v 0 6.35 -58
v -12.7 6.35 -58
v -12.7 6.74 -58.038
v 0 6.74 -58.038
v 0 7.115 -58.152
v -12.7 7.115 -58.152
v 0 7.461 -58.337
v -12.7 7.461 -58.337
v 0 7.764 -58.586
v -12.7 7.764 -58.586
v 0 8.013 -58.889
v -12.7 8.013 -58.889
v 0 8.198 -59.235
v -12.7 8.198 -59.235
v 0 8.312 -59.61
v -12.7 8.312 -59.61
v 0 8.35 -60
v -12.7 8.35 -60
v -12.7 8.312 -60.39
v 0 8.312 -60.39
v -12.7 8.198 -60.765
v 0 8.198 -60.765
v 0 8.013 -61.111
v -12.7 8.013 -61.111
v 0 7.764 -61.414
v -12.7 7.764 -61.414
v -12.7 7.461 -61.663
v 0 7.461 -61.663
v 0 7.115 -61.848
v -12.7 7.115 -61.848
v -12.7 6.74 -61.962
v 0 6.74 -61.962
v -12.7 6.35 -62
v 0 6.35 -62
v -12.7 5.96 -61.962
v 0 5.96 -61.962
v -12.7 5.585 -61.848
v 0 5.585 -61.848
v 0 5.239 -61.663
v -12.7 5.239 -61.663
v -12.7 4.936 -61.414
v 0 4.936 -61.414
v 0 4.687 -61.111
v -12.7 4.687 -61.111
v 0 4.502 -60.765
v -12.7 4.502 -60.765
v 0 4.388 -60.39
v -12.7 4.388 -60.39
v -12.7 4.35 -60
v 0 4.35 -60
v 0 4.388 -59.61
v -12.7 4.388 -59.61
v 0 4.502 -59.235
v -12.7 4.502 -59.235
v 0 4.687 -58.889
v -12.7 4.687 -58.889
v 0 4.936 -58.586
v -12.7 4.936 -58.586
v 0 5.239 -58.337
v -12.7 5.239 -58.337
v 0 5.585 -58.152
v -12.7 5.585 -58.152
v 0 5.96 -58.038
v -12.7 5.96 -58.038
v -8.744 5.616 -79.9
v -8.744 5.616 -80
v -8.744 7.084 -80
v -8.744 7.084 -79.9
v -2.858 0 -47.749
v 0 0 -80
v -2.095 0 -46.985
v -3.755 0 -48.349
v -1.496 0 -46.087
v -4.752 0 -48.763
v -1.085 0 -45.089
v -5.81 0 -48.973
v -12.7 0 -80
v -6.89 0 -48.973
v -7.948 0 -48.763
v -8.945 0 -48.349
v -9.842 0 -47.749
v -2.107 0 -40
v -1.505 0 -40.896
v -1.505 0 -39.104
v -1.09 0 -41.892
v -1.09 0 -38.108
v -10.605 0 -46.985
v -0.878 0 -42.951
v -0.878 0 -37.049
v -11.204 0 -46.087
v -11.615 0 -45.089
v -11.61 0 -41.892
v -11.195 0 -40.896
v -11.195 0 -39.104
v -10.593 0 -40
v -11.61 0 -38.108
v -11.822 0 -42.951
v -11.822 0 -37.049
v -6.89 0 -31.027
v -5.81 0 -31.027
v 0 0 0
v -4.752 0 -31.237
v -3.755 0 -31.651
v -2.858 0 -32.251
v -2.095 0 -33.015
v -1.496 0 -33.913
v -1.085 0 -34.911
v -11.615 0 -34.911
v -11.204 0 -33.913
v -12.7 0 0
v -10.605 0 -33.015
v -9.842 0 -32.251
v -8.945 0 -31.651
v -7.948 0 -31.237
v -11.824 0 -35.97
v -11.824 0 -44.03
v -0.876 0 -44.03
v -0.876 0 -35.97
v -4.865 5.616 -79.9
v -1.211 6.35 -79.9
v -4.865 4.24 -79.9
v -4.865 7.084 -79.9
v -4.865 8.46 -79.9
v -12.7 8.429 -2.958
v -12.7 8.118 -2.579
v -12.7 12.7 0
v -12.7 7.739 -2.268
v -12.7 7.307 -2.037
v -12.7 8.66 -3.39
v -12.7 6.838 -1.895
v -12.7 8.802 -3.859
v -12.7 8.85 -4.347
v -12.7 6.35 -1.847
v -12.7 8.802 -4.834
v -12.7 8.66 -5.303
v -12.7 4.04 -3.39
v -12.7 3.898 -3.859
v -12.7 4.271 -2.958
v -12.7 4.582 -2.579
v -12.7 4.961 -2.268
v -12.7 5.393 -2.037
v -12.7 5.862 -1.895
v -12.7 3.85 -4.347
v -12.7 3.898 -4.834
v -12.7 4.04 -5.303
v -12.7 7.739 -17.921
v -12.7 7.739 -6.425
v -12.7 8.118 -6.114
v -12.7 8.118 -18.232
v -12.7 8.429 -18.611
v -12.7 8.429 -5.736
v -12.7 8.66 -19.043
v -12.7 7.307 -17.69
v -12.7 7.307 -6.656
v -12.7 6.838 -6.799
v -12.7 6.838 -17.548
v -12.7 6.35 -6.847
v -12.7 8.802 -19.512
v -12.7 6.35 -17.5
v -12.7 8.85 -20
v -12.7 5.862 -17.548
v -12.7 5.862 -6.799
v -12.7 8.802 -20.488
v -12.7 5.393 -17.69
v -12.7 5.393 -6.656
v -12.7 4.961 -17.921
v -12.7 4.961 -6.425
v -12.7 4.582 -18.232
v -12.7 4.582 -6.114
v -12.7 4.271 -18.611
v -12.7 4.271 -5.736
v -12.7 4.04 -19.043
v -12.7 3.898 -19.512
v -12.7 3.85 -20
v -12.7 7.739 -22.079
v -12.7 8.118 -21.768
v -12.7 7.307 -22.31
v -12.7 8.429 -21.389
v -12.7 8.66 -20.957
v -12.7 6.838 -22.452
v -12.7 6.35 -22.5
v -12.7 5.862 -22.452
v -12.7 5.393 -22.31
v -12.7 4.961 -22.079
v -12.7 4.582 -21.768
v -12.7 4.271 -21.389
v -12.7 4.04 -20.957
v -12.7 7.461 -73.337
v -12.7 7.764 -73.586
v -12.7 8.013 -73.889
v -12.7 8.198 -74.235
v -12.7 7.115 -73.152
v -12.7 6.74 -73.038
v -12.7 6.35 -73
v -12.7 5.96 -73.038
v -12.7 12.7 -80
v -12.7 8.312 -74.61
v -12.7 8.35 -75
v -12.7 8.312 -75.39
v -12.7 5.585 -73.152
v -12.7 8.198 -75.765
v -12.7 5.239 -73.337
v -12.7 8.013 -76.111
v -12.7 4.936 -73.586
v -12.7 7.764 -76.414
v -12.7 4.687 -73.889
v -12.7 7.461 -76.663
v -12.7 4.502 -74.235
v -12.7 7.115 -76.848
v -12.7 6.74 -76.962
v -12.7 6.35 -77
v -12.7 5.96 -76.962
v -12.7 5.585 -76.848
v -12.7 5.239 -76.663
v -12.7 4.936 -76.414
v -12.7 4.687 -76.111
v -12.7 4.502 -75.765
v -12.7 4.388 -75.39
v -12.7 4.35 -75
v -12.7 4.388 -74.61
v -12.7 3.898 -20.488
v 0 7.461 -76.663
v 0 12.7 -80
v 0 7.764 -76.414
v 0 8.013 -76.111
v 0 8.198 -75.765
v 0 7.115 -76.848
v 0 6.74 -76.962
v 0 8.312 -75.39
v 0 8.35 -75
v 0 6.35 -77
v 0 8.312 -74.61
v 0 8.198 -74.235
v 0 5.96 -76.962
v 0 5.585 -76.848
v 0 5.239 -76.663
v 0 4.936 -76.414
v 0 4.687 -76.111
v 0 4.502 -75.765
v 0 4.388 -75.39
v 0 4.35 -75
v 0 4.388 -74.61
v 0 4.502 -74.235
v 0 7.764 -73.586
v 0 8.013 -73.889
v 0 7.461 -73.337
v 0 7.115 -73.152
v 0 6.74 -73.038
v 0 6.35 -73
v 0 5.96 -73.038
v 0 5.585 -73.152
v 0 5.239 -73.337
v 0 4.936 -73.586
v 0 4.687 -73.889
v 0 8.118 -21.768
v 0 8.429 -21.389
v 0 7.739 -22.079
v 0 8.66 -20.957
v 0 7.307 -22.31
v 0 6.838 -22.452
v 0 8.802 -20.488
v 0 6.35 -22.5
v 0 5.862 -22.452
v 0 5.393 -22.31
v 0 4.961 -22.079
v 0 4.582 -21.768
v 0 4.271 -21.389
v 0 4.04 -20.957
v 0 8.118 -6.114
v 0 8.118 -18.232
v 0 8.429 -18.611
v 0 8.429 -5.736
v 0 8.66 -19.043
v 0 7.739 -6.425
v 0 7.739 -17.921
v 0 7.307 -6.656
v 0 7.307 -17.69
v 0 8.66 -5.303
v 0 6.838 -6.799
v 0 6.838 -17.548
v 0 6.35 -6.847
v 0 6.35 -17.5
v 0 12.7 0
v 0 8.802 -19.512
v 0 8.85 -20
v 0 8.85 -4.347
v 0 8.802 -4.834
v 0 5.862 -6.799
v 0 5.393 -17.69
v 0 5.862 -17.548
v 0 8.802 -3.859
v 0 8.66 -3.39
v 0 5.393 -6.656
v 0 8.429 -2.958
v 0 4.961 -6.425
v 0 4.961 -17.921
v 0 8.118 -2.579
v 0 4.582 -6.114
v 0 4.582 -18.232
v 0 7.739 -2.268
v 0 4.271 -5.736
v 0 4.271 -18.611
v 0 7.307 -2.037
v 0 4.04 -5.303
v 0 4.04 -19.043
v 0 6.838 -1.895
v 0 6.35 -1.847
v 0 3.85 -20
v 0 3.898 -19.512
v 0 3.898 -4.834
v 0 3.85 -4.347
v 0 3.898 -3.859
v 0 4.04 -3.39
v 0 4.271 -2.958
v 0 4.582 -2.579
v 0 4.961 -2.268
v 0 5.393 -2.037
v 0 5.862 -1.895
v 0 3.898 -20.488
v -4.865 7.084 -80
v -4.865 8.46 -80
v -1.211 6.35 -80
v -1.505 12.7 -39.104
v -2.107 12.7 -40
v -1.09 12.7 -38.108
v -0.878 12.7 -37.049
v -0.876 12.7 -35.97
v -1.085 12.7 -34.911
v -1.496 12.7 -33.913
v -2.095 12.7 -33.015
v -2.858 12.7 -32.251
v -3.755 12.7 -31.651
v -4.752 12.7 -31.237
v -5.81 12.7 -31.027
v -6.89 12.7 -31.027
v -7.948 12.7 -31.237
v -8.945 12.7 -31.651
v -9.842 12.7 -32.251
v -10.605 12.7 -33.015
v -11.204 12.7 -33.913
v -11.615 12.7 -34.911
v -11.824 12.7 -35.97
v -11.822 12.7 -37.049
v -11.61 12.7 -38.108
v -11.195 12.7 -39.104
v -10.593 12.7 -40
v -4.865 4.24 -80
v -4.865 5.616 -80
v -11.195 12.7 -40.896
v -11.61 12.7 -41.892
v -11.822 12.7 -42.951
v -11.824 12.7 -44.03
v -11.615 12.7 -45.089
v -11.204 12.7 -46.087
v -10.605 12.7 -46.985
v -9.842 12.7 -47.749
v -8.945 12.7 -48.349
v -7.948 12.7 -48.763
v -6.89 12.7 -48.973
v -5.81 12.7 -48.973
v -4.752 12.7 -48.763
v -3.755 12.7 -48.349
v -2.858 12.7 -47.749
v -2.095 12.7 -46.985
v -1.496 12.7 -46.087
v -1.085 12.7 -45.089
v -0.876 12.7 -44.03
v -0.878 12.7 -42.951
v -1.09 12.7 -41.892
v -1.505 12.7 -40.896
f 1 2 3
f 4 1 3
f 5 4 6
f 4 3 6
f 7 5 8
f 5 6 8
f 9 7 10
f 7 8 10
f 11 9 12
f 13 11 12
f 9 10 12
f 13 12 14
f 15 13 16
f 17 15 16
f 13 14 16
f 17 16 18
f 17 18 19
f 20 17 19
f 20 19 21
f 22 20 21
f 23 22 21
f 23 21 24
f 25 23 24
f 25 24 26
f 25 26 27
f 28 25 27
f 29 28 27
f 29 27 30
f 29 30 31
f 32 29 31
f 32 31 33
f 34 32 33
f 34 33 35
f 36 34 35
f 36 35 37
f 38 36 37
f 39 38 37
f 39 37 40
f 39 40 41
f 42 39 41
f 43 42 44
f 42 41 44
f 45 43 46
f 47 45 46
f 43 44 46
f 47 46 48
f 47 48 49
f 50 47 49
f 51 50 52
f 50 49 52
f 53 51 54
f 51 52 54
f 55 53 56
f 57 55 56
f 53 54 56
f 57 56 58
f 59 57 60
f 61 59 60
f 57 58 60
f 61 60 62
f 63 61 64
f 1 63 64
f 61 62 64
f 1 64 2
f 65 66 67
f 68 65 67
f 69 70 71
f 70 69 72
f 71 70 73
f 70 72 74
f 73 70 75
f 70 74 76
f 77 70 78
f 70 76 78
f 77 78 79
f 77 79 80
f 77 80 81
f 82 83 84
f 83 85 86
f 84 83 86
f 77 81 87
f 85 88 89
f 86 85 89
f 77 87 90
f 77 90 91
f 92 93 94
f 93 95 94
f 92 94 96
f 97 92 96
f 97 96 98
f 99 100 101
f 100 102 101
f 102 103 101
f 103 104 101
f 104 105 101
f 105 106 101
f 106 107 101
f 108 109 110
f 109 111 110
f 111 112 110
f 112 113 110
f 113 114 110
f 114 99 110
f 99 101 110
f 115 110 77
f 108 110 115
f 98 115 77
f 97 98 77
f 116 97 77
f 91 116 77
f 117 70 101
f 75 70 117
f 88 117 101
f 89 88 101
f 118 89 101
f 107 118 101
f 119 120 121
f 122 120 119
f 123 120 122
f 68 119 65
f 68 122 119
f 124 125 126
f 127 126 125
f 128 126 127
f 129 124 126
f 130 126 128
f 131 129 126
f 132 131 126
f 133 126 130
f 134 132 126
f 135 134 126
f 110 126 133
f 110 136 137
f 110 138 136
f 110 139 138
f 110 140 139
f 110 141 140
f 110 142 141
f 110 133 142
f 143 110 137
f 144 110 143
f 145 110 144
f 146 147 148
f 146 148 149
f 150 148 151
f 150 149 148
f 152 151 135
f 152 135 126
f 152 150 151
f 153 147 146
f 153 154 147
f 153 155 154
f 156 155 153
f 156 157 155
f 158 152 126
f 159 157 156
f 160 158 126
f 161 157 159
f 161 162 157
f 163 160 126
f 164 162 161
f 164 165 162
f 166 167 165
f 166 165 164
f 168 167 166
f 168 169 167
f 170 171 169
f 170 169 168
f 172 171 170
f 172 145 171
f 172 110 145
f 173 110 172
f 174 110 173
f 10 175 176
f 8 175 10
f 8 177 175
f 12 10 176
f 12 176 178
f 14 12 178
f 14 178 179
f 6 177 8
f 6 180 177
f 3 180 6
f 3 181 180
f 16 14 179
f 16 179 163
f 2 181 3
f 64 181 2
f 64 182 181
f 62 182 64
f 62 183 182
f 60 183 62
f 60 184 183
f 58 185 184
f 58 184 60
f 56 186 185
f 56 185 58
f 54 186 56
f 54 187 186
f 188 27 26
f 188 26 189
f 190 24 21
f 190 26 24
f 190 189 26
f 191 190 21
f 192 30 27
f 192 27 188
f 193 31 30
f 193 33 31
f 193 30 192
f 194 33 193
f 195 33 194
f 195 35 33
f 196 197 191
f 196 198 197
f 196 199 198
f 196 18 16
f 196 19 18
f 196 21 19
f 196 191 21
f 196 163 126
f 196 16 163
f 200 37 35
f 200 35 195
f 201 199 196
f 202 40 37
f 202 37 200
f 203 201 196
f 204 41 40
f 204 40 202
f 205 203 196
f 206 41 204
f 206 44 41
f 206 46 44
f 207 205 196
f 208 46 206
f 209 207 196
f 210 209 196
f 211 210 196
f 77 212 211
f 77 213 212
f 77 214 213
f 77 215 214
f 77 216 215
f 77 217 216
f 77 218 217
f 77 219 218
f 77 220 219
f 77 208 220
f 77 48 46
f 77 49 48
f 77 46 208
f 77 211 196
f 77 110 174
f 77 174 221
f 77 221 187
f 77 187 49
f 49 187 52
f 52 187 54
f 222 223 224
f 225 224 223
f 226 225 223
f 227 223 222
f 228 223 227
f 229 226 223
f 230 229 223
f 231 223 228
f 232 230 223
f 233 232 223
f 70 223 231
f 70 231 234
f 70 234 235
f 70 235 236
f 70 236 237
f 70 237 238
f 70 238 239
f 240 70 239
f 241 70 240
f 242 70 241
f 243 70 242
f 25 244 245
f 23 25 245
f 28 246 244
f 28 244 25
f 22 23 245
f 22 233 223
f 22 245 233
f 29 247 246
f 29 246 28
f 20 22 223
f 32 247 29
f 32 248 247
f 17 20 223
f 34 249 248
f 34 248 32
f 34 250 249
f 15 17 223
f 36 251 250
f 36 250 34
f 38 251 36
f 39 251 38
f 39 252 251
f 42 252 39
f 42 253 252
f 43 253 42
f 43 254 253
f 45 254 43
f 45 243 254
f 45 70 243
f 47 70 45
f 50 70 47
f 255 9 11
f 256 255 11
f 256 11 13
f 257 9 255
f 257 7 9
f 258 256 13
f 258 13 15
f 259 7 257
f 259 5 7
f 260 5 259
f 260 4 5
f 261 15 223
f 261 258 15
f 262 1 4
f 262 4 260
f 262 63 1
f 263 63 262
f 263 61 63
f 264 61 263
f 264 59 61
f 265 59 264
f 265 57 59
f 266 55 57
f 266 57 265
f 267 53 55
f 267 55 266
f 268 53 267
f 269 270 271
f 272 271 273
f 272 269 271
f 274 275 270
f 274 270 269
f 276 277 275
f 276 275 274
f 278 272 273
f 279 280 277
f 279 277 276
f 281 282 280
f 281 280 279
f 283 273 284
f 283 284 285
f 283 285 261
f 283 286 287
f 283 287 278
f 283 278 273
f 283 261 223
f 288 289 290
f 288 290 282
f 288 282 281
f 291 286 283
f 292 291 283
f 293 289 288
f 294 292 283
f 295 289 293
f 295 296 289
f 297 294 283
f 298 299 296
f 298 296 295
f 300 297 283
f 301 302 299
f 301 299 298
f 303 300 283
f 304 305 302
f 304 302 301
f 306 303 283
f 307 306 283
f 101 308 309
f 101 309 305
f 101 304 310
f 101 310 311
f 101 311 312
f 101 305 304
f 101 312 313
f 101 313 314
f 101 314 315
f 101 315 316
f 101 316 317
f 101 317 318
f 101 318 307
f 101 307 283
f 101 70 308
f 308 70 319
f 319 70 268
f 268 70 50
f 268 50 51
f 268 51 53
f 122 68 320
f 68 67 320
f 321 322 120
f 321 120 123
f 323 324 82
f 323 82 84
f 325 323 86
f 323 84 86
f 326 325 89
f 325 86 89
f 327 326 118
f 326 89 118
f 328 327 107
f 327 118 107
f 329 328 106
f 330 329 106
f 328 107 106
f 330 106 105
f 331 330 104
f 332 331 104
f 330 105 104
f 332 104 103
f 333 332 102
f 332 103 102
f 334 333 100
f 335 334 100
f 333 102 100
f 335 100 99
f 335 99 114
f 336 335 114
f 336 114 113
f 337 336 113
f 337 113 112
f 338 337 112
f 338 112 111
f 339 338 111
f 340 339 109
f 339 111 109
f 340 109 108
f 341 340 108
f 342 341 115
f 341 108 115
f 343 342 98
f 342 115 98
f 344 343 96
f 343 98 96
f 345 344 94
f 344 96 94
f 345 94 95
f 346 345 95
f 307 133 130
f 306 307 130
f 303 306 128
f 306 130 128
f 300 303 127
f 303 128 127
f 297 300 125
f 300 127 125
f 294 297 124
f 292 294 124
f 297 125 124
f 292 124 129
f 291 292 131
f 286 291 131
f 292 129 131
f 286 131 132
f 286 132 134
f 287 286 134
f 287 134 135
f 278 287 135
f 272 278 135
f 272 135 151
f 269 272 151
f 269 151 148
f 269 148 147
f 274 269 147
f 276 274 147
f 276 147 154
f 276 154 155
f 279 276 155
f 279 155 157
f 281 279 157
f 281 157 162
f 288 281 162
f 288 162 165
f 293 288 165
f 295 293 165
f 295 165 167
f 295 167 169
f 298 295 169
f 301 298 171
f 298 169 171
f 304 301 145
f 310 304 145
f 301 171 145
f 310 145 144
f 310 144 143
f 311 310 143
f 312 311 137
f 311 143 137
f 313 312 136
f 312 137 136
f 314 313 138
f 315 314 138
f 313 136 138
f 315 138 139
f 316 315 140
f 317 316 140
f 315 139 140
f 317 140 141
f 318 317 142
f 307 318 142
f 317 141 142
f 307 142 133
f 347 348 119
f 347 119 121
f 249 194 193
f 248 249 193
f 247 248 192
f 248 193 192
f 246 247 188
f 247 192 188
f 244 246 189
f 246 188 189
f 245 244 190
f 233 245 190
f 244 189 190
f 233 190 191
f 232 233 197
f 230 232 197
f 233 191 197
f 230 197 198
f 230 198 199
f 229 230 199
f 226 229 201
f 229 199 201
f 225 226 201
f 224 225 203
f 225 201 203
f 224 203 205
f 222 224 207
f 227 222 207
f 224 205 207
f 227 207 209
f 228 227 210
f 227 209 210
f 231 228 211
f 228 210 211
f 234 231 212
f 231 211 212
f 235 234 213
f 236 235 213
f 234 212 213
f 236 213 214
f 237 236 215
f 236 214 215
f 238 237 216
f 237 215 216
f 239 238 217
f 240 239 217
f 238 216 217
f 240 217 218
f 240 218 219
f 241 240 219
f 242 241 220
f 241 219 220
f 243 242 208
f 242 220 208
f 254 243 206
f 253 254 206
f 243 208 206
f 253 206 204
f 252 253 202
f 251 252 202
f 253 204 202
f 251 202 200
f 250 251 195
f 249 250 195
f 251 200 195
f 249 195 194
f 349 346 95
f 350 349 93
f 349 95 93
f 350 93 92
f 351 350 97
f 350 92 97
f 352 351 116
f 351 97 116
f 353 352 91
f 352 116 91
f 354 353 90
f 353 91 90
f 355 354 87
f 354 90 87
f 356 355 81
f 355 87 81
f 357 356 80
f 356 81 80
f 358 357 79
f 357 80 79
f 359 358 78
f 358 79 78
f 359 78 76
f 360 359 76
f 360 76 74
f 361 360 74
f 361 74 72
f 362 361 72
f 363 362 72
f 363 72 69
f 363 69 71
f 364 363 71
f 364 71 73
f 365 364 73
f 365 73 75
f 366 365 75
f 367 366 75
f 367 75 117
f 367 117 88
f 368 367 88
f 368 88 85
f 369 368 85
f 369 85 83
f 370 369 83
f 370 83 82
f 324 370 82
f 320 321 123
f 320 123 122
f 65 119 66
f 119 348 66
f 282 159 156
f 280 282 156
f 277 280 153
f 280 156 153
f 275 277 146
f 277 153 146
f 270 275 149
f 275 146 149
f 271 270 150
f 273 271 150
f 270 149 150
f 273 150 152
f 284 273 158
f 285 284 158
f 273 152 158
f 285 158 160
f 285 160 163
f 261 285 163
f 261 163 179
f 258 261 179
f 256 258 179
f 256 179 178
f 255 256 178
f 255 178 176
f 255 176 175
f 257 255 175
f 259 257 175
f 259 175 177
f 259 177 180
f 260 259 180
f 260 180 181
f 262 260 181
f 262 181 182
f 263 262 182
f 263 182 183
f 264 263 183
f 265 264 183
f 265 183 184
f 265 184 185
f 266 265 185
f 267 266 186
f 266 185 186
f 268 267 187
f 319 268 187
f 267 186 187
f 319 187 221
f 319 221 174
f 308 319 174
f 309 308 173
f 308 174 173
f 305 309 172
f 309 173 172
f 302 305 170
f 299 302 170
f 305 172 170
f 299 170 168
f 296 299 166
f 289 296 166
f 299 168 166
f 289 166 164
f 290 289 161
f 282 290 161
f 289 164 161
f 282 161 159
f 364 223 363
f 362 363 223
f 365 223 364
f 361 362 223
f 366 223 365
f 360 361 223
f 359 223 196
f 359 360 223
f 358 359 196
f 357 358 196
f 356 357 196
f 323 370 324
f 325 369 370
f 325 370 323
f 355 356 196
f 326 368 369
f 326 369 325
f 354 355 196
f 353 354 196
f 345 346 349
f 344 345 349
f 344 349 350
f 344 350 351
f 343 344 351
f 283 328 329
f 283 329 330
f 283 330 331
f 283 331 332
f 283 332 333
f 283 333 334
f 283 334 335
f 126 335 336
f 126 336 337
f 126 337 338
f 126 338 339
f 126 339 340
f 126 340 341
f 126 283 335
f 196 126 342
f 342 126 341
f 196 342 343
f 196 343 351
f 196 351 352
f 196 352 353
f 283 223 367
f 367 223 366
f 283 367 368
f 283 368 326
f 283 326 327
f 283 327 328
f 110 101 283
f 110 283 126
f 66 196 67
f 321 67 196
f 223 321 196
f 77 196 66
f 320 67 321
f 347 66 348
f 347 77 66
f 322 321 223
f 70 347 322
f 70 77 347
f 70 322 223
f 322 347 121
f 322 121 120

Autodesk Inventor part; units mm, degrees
ref_plane "YZ Plane" through (0, 0, 0) normal (1, 0, 0) x (0, 1, 0)
ref_plane "XZ Plane" through (0, 0, 0) normal (0, 1, 0) x (-1, 0, 0)
ref_plane "XY Plane" through (0, 0, 0) normal (0, 0, 1) x (1, 0, 0)
sketch "Sketch1" plane through (0, 0, 0) normal (0, 1, 0) x (-1, 0, 0)
  line L0 (0, 0) -> (12.7, 0)
  line L1 (12.7, 0) -> (12.7, -80)
  line L2 (12.7, -80) -> (0, -80)
  line L3 (0, -80) -> (0, 0)
  circle A0 centre (6.35, -36.5) radius 5.5
  circle A1 centre (6.35, -43.5) radius 5.5
  line L4 (6.35, -36.5) -> (6.35, -43.5) construction
  point P0 (6.35, -40)
  point P1 (0, -40)
  point P2 (6.35, -80)
  dimension "d0" = 12.7
  dimension "d1" = 80
  dimension "d2" = 11
  dimension "d3" = 11
  dimension "d4" = 7
extrude "Extrusion1" add sketch "Sketch1" along normal blind 12.7
sketch "Sketch2" plane through (-12.7, 0, -80) normal (-1, 0, 0) x (0, 0, 1)
  line L0 (40, 0) -> (40, 12.7) projected
  line L1 (40, 6.35) -> (20, 6.35) construction
  line L2 (20, 6.35) -> (5, 6.35) construction
  circle A0 centre (5, 6.35) radius 2
  circle A1 centre (20, 6.35) radius 2
  line L3 (40, 6.35) -> (60, 6.35) construction
  line L4 (60, 6.35) -> (75, 6.35) construction
  circle A2 centre (60, 6.35) radius 2.5
  circle A3 centre (75.6534, 6.35) radius 2.5
  point P0 (80, 0)
  dimension "d7" = 20
  dimension "d8" = 15
  dimension "d9" = 4
  dimension "d10" = 4
  dimension "d11" = 5
  dimension "d12" = 5
sketch "Sketch3" plane through (0, 0, -80) normal (0, 0, -1) x (-1, 0, 0)
  line L0 (8.7436, 7.084) -> (3.6466, 7.084)
  line L1 (3.6466, 7.084) -> (3.6466, 5.616)
  line L2 (3.6466, 5.616) -> (8.7436, 5.616)
  line L3 (8.7436, 5.616) -> (8.7436, 7.084)
  line L4 (8.7436, 7.084) -> (3.6466, 5.616) construction
  line L5 (3.6466, 7.084) -> (8.7436, 5.616) construction
  line L6 (1.2106, 6.35) -> (4.8647, 8.4597)
  line L7 (4.8647, 8.4597) -> (4.8647, 4.2403)
  line L8 (4.8647, 4.2403) -> (1.2106, 6.35)
  point P0 (0, 0)
  point P1 (6.1951, 6.35)
  point P2 (3.6466, 6.35)
extrude "Extrusion2" cut sketch "Sketch3" against normal blind 0.1
extrude "Extrusion3" cut sketch "Sketch2" against normal through all
properties part number "LoadCell"
